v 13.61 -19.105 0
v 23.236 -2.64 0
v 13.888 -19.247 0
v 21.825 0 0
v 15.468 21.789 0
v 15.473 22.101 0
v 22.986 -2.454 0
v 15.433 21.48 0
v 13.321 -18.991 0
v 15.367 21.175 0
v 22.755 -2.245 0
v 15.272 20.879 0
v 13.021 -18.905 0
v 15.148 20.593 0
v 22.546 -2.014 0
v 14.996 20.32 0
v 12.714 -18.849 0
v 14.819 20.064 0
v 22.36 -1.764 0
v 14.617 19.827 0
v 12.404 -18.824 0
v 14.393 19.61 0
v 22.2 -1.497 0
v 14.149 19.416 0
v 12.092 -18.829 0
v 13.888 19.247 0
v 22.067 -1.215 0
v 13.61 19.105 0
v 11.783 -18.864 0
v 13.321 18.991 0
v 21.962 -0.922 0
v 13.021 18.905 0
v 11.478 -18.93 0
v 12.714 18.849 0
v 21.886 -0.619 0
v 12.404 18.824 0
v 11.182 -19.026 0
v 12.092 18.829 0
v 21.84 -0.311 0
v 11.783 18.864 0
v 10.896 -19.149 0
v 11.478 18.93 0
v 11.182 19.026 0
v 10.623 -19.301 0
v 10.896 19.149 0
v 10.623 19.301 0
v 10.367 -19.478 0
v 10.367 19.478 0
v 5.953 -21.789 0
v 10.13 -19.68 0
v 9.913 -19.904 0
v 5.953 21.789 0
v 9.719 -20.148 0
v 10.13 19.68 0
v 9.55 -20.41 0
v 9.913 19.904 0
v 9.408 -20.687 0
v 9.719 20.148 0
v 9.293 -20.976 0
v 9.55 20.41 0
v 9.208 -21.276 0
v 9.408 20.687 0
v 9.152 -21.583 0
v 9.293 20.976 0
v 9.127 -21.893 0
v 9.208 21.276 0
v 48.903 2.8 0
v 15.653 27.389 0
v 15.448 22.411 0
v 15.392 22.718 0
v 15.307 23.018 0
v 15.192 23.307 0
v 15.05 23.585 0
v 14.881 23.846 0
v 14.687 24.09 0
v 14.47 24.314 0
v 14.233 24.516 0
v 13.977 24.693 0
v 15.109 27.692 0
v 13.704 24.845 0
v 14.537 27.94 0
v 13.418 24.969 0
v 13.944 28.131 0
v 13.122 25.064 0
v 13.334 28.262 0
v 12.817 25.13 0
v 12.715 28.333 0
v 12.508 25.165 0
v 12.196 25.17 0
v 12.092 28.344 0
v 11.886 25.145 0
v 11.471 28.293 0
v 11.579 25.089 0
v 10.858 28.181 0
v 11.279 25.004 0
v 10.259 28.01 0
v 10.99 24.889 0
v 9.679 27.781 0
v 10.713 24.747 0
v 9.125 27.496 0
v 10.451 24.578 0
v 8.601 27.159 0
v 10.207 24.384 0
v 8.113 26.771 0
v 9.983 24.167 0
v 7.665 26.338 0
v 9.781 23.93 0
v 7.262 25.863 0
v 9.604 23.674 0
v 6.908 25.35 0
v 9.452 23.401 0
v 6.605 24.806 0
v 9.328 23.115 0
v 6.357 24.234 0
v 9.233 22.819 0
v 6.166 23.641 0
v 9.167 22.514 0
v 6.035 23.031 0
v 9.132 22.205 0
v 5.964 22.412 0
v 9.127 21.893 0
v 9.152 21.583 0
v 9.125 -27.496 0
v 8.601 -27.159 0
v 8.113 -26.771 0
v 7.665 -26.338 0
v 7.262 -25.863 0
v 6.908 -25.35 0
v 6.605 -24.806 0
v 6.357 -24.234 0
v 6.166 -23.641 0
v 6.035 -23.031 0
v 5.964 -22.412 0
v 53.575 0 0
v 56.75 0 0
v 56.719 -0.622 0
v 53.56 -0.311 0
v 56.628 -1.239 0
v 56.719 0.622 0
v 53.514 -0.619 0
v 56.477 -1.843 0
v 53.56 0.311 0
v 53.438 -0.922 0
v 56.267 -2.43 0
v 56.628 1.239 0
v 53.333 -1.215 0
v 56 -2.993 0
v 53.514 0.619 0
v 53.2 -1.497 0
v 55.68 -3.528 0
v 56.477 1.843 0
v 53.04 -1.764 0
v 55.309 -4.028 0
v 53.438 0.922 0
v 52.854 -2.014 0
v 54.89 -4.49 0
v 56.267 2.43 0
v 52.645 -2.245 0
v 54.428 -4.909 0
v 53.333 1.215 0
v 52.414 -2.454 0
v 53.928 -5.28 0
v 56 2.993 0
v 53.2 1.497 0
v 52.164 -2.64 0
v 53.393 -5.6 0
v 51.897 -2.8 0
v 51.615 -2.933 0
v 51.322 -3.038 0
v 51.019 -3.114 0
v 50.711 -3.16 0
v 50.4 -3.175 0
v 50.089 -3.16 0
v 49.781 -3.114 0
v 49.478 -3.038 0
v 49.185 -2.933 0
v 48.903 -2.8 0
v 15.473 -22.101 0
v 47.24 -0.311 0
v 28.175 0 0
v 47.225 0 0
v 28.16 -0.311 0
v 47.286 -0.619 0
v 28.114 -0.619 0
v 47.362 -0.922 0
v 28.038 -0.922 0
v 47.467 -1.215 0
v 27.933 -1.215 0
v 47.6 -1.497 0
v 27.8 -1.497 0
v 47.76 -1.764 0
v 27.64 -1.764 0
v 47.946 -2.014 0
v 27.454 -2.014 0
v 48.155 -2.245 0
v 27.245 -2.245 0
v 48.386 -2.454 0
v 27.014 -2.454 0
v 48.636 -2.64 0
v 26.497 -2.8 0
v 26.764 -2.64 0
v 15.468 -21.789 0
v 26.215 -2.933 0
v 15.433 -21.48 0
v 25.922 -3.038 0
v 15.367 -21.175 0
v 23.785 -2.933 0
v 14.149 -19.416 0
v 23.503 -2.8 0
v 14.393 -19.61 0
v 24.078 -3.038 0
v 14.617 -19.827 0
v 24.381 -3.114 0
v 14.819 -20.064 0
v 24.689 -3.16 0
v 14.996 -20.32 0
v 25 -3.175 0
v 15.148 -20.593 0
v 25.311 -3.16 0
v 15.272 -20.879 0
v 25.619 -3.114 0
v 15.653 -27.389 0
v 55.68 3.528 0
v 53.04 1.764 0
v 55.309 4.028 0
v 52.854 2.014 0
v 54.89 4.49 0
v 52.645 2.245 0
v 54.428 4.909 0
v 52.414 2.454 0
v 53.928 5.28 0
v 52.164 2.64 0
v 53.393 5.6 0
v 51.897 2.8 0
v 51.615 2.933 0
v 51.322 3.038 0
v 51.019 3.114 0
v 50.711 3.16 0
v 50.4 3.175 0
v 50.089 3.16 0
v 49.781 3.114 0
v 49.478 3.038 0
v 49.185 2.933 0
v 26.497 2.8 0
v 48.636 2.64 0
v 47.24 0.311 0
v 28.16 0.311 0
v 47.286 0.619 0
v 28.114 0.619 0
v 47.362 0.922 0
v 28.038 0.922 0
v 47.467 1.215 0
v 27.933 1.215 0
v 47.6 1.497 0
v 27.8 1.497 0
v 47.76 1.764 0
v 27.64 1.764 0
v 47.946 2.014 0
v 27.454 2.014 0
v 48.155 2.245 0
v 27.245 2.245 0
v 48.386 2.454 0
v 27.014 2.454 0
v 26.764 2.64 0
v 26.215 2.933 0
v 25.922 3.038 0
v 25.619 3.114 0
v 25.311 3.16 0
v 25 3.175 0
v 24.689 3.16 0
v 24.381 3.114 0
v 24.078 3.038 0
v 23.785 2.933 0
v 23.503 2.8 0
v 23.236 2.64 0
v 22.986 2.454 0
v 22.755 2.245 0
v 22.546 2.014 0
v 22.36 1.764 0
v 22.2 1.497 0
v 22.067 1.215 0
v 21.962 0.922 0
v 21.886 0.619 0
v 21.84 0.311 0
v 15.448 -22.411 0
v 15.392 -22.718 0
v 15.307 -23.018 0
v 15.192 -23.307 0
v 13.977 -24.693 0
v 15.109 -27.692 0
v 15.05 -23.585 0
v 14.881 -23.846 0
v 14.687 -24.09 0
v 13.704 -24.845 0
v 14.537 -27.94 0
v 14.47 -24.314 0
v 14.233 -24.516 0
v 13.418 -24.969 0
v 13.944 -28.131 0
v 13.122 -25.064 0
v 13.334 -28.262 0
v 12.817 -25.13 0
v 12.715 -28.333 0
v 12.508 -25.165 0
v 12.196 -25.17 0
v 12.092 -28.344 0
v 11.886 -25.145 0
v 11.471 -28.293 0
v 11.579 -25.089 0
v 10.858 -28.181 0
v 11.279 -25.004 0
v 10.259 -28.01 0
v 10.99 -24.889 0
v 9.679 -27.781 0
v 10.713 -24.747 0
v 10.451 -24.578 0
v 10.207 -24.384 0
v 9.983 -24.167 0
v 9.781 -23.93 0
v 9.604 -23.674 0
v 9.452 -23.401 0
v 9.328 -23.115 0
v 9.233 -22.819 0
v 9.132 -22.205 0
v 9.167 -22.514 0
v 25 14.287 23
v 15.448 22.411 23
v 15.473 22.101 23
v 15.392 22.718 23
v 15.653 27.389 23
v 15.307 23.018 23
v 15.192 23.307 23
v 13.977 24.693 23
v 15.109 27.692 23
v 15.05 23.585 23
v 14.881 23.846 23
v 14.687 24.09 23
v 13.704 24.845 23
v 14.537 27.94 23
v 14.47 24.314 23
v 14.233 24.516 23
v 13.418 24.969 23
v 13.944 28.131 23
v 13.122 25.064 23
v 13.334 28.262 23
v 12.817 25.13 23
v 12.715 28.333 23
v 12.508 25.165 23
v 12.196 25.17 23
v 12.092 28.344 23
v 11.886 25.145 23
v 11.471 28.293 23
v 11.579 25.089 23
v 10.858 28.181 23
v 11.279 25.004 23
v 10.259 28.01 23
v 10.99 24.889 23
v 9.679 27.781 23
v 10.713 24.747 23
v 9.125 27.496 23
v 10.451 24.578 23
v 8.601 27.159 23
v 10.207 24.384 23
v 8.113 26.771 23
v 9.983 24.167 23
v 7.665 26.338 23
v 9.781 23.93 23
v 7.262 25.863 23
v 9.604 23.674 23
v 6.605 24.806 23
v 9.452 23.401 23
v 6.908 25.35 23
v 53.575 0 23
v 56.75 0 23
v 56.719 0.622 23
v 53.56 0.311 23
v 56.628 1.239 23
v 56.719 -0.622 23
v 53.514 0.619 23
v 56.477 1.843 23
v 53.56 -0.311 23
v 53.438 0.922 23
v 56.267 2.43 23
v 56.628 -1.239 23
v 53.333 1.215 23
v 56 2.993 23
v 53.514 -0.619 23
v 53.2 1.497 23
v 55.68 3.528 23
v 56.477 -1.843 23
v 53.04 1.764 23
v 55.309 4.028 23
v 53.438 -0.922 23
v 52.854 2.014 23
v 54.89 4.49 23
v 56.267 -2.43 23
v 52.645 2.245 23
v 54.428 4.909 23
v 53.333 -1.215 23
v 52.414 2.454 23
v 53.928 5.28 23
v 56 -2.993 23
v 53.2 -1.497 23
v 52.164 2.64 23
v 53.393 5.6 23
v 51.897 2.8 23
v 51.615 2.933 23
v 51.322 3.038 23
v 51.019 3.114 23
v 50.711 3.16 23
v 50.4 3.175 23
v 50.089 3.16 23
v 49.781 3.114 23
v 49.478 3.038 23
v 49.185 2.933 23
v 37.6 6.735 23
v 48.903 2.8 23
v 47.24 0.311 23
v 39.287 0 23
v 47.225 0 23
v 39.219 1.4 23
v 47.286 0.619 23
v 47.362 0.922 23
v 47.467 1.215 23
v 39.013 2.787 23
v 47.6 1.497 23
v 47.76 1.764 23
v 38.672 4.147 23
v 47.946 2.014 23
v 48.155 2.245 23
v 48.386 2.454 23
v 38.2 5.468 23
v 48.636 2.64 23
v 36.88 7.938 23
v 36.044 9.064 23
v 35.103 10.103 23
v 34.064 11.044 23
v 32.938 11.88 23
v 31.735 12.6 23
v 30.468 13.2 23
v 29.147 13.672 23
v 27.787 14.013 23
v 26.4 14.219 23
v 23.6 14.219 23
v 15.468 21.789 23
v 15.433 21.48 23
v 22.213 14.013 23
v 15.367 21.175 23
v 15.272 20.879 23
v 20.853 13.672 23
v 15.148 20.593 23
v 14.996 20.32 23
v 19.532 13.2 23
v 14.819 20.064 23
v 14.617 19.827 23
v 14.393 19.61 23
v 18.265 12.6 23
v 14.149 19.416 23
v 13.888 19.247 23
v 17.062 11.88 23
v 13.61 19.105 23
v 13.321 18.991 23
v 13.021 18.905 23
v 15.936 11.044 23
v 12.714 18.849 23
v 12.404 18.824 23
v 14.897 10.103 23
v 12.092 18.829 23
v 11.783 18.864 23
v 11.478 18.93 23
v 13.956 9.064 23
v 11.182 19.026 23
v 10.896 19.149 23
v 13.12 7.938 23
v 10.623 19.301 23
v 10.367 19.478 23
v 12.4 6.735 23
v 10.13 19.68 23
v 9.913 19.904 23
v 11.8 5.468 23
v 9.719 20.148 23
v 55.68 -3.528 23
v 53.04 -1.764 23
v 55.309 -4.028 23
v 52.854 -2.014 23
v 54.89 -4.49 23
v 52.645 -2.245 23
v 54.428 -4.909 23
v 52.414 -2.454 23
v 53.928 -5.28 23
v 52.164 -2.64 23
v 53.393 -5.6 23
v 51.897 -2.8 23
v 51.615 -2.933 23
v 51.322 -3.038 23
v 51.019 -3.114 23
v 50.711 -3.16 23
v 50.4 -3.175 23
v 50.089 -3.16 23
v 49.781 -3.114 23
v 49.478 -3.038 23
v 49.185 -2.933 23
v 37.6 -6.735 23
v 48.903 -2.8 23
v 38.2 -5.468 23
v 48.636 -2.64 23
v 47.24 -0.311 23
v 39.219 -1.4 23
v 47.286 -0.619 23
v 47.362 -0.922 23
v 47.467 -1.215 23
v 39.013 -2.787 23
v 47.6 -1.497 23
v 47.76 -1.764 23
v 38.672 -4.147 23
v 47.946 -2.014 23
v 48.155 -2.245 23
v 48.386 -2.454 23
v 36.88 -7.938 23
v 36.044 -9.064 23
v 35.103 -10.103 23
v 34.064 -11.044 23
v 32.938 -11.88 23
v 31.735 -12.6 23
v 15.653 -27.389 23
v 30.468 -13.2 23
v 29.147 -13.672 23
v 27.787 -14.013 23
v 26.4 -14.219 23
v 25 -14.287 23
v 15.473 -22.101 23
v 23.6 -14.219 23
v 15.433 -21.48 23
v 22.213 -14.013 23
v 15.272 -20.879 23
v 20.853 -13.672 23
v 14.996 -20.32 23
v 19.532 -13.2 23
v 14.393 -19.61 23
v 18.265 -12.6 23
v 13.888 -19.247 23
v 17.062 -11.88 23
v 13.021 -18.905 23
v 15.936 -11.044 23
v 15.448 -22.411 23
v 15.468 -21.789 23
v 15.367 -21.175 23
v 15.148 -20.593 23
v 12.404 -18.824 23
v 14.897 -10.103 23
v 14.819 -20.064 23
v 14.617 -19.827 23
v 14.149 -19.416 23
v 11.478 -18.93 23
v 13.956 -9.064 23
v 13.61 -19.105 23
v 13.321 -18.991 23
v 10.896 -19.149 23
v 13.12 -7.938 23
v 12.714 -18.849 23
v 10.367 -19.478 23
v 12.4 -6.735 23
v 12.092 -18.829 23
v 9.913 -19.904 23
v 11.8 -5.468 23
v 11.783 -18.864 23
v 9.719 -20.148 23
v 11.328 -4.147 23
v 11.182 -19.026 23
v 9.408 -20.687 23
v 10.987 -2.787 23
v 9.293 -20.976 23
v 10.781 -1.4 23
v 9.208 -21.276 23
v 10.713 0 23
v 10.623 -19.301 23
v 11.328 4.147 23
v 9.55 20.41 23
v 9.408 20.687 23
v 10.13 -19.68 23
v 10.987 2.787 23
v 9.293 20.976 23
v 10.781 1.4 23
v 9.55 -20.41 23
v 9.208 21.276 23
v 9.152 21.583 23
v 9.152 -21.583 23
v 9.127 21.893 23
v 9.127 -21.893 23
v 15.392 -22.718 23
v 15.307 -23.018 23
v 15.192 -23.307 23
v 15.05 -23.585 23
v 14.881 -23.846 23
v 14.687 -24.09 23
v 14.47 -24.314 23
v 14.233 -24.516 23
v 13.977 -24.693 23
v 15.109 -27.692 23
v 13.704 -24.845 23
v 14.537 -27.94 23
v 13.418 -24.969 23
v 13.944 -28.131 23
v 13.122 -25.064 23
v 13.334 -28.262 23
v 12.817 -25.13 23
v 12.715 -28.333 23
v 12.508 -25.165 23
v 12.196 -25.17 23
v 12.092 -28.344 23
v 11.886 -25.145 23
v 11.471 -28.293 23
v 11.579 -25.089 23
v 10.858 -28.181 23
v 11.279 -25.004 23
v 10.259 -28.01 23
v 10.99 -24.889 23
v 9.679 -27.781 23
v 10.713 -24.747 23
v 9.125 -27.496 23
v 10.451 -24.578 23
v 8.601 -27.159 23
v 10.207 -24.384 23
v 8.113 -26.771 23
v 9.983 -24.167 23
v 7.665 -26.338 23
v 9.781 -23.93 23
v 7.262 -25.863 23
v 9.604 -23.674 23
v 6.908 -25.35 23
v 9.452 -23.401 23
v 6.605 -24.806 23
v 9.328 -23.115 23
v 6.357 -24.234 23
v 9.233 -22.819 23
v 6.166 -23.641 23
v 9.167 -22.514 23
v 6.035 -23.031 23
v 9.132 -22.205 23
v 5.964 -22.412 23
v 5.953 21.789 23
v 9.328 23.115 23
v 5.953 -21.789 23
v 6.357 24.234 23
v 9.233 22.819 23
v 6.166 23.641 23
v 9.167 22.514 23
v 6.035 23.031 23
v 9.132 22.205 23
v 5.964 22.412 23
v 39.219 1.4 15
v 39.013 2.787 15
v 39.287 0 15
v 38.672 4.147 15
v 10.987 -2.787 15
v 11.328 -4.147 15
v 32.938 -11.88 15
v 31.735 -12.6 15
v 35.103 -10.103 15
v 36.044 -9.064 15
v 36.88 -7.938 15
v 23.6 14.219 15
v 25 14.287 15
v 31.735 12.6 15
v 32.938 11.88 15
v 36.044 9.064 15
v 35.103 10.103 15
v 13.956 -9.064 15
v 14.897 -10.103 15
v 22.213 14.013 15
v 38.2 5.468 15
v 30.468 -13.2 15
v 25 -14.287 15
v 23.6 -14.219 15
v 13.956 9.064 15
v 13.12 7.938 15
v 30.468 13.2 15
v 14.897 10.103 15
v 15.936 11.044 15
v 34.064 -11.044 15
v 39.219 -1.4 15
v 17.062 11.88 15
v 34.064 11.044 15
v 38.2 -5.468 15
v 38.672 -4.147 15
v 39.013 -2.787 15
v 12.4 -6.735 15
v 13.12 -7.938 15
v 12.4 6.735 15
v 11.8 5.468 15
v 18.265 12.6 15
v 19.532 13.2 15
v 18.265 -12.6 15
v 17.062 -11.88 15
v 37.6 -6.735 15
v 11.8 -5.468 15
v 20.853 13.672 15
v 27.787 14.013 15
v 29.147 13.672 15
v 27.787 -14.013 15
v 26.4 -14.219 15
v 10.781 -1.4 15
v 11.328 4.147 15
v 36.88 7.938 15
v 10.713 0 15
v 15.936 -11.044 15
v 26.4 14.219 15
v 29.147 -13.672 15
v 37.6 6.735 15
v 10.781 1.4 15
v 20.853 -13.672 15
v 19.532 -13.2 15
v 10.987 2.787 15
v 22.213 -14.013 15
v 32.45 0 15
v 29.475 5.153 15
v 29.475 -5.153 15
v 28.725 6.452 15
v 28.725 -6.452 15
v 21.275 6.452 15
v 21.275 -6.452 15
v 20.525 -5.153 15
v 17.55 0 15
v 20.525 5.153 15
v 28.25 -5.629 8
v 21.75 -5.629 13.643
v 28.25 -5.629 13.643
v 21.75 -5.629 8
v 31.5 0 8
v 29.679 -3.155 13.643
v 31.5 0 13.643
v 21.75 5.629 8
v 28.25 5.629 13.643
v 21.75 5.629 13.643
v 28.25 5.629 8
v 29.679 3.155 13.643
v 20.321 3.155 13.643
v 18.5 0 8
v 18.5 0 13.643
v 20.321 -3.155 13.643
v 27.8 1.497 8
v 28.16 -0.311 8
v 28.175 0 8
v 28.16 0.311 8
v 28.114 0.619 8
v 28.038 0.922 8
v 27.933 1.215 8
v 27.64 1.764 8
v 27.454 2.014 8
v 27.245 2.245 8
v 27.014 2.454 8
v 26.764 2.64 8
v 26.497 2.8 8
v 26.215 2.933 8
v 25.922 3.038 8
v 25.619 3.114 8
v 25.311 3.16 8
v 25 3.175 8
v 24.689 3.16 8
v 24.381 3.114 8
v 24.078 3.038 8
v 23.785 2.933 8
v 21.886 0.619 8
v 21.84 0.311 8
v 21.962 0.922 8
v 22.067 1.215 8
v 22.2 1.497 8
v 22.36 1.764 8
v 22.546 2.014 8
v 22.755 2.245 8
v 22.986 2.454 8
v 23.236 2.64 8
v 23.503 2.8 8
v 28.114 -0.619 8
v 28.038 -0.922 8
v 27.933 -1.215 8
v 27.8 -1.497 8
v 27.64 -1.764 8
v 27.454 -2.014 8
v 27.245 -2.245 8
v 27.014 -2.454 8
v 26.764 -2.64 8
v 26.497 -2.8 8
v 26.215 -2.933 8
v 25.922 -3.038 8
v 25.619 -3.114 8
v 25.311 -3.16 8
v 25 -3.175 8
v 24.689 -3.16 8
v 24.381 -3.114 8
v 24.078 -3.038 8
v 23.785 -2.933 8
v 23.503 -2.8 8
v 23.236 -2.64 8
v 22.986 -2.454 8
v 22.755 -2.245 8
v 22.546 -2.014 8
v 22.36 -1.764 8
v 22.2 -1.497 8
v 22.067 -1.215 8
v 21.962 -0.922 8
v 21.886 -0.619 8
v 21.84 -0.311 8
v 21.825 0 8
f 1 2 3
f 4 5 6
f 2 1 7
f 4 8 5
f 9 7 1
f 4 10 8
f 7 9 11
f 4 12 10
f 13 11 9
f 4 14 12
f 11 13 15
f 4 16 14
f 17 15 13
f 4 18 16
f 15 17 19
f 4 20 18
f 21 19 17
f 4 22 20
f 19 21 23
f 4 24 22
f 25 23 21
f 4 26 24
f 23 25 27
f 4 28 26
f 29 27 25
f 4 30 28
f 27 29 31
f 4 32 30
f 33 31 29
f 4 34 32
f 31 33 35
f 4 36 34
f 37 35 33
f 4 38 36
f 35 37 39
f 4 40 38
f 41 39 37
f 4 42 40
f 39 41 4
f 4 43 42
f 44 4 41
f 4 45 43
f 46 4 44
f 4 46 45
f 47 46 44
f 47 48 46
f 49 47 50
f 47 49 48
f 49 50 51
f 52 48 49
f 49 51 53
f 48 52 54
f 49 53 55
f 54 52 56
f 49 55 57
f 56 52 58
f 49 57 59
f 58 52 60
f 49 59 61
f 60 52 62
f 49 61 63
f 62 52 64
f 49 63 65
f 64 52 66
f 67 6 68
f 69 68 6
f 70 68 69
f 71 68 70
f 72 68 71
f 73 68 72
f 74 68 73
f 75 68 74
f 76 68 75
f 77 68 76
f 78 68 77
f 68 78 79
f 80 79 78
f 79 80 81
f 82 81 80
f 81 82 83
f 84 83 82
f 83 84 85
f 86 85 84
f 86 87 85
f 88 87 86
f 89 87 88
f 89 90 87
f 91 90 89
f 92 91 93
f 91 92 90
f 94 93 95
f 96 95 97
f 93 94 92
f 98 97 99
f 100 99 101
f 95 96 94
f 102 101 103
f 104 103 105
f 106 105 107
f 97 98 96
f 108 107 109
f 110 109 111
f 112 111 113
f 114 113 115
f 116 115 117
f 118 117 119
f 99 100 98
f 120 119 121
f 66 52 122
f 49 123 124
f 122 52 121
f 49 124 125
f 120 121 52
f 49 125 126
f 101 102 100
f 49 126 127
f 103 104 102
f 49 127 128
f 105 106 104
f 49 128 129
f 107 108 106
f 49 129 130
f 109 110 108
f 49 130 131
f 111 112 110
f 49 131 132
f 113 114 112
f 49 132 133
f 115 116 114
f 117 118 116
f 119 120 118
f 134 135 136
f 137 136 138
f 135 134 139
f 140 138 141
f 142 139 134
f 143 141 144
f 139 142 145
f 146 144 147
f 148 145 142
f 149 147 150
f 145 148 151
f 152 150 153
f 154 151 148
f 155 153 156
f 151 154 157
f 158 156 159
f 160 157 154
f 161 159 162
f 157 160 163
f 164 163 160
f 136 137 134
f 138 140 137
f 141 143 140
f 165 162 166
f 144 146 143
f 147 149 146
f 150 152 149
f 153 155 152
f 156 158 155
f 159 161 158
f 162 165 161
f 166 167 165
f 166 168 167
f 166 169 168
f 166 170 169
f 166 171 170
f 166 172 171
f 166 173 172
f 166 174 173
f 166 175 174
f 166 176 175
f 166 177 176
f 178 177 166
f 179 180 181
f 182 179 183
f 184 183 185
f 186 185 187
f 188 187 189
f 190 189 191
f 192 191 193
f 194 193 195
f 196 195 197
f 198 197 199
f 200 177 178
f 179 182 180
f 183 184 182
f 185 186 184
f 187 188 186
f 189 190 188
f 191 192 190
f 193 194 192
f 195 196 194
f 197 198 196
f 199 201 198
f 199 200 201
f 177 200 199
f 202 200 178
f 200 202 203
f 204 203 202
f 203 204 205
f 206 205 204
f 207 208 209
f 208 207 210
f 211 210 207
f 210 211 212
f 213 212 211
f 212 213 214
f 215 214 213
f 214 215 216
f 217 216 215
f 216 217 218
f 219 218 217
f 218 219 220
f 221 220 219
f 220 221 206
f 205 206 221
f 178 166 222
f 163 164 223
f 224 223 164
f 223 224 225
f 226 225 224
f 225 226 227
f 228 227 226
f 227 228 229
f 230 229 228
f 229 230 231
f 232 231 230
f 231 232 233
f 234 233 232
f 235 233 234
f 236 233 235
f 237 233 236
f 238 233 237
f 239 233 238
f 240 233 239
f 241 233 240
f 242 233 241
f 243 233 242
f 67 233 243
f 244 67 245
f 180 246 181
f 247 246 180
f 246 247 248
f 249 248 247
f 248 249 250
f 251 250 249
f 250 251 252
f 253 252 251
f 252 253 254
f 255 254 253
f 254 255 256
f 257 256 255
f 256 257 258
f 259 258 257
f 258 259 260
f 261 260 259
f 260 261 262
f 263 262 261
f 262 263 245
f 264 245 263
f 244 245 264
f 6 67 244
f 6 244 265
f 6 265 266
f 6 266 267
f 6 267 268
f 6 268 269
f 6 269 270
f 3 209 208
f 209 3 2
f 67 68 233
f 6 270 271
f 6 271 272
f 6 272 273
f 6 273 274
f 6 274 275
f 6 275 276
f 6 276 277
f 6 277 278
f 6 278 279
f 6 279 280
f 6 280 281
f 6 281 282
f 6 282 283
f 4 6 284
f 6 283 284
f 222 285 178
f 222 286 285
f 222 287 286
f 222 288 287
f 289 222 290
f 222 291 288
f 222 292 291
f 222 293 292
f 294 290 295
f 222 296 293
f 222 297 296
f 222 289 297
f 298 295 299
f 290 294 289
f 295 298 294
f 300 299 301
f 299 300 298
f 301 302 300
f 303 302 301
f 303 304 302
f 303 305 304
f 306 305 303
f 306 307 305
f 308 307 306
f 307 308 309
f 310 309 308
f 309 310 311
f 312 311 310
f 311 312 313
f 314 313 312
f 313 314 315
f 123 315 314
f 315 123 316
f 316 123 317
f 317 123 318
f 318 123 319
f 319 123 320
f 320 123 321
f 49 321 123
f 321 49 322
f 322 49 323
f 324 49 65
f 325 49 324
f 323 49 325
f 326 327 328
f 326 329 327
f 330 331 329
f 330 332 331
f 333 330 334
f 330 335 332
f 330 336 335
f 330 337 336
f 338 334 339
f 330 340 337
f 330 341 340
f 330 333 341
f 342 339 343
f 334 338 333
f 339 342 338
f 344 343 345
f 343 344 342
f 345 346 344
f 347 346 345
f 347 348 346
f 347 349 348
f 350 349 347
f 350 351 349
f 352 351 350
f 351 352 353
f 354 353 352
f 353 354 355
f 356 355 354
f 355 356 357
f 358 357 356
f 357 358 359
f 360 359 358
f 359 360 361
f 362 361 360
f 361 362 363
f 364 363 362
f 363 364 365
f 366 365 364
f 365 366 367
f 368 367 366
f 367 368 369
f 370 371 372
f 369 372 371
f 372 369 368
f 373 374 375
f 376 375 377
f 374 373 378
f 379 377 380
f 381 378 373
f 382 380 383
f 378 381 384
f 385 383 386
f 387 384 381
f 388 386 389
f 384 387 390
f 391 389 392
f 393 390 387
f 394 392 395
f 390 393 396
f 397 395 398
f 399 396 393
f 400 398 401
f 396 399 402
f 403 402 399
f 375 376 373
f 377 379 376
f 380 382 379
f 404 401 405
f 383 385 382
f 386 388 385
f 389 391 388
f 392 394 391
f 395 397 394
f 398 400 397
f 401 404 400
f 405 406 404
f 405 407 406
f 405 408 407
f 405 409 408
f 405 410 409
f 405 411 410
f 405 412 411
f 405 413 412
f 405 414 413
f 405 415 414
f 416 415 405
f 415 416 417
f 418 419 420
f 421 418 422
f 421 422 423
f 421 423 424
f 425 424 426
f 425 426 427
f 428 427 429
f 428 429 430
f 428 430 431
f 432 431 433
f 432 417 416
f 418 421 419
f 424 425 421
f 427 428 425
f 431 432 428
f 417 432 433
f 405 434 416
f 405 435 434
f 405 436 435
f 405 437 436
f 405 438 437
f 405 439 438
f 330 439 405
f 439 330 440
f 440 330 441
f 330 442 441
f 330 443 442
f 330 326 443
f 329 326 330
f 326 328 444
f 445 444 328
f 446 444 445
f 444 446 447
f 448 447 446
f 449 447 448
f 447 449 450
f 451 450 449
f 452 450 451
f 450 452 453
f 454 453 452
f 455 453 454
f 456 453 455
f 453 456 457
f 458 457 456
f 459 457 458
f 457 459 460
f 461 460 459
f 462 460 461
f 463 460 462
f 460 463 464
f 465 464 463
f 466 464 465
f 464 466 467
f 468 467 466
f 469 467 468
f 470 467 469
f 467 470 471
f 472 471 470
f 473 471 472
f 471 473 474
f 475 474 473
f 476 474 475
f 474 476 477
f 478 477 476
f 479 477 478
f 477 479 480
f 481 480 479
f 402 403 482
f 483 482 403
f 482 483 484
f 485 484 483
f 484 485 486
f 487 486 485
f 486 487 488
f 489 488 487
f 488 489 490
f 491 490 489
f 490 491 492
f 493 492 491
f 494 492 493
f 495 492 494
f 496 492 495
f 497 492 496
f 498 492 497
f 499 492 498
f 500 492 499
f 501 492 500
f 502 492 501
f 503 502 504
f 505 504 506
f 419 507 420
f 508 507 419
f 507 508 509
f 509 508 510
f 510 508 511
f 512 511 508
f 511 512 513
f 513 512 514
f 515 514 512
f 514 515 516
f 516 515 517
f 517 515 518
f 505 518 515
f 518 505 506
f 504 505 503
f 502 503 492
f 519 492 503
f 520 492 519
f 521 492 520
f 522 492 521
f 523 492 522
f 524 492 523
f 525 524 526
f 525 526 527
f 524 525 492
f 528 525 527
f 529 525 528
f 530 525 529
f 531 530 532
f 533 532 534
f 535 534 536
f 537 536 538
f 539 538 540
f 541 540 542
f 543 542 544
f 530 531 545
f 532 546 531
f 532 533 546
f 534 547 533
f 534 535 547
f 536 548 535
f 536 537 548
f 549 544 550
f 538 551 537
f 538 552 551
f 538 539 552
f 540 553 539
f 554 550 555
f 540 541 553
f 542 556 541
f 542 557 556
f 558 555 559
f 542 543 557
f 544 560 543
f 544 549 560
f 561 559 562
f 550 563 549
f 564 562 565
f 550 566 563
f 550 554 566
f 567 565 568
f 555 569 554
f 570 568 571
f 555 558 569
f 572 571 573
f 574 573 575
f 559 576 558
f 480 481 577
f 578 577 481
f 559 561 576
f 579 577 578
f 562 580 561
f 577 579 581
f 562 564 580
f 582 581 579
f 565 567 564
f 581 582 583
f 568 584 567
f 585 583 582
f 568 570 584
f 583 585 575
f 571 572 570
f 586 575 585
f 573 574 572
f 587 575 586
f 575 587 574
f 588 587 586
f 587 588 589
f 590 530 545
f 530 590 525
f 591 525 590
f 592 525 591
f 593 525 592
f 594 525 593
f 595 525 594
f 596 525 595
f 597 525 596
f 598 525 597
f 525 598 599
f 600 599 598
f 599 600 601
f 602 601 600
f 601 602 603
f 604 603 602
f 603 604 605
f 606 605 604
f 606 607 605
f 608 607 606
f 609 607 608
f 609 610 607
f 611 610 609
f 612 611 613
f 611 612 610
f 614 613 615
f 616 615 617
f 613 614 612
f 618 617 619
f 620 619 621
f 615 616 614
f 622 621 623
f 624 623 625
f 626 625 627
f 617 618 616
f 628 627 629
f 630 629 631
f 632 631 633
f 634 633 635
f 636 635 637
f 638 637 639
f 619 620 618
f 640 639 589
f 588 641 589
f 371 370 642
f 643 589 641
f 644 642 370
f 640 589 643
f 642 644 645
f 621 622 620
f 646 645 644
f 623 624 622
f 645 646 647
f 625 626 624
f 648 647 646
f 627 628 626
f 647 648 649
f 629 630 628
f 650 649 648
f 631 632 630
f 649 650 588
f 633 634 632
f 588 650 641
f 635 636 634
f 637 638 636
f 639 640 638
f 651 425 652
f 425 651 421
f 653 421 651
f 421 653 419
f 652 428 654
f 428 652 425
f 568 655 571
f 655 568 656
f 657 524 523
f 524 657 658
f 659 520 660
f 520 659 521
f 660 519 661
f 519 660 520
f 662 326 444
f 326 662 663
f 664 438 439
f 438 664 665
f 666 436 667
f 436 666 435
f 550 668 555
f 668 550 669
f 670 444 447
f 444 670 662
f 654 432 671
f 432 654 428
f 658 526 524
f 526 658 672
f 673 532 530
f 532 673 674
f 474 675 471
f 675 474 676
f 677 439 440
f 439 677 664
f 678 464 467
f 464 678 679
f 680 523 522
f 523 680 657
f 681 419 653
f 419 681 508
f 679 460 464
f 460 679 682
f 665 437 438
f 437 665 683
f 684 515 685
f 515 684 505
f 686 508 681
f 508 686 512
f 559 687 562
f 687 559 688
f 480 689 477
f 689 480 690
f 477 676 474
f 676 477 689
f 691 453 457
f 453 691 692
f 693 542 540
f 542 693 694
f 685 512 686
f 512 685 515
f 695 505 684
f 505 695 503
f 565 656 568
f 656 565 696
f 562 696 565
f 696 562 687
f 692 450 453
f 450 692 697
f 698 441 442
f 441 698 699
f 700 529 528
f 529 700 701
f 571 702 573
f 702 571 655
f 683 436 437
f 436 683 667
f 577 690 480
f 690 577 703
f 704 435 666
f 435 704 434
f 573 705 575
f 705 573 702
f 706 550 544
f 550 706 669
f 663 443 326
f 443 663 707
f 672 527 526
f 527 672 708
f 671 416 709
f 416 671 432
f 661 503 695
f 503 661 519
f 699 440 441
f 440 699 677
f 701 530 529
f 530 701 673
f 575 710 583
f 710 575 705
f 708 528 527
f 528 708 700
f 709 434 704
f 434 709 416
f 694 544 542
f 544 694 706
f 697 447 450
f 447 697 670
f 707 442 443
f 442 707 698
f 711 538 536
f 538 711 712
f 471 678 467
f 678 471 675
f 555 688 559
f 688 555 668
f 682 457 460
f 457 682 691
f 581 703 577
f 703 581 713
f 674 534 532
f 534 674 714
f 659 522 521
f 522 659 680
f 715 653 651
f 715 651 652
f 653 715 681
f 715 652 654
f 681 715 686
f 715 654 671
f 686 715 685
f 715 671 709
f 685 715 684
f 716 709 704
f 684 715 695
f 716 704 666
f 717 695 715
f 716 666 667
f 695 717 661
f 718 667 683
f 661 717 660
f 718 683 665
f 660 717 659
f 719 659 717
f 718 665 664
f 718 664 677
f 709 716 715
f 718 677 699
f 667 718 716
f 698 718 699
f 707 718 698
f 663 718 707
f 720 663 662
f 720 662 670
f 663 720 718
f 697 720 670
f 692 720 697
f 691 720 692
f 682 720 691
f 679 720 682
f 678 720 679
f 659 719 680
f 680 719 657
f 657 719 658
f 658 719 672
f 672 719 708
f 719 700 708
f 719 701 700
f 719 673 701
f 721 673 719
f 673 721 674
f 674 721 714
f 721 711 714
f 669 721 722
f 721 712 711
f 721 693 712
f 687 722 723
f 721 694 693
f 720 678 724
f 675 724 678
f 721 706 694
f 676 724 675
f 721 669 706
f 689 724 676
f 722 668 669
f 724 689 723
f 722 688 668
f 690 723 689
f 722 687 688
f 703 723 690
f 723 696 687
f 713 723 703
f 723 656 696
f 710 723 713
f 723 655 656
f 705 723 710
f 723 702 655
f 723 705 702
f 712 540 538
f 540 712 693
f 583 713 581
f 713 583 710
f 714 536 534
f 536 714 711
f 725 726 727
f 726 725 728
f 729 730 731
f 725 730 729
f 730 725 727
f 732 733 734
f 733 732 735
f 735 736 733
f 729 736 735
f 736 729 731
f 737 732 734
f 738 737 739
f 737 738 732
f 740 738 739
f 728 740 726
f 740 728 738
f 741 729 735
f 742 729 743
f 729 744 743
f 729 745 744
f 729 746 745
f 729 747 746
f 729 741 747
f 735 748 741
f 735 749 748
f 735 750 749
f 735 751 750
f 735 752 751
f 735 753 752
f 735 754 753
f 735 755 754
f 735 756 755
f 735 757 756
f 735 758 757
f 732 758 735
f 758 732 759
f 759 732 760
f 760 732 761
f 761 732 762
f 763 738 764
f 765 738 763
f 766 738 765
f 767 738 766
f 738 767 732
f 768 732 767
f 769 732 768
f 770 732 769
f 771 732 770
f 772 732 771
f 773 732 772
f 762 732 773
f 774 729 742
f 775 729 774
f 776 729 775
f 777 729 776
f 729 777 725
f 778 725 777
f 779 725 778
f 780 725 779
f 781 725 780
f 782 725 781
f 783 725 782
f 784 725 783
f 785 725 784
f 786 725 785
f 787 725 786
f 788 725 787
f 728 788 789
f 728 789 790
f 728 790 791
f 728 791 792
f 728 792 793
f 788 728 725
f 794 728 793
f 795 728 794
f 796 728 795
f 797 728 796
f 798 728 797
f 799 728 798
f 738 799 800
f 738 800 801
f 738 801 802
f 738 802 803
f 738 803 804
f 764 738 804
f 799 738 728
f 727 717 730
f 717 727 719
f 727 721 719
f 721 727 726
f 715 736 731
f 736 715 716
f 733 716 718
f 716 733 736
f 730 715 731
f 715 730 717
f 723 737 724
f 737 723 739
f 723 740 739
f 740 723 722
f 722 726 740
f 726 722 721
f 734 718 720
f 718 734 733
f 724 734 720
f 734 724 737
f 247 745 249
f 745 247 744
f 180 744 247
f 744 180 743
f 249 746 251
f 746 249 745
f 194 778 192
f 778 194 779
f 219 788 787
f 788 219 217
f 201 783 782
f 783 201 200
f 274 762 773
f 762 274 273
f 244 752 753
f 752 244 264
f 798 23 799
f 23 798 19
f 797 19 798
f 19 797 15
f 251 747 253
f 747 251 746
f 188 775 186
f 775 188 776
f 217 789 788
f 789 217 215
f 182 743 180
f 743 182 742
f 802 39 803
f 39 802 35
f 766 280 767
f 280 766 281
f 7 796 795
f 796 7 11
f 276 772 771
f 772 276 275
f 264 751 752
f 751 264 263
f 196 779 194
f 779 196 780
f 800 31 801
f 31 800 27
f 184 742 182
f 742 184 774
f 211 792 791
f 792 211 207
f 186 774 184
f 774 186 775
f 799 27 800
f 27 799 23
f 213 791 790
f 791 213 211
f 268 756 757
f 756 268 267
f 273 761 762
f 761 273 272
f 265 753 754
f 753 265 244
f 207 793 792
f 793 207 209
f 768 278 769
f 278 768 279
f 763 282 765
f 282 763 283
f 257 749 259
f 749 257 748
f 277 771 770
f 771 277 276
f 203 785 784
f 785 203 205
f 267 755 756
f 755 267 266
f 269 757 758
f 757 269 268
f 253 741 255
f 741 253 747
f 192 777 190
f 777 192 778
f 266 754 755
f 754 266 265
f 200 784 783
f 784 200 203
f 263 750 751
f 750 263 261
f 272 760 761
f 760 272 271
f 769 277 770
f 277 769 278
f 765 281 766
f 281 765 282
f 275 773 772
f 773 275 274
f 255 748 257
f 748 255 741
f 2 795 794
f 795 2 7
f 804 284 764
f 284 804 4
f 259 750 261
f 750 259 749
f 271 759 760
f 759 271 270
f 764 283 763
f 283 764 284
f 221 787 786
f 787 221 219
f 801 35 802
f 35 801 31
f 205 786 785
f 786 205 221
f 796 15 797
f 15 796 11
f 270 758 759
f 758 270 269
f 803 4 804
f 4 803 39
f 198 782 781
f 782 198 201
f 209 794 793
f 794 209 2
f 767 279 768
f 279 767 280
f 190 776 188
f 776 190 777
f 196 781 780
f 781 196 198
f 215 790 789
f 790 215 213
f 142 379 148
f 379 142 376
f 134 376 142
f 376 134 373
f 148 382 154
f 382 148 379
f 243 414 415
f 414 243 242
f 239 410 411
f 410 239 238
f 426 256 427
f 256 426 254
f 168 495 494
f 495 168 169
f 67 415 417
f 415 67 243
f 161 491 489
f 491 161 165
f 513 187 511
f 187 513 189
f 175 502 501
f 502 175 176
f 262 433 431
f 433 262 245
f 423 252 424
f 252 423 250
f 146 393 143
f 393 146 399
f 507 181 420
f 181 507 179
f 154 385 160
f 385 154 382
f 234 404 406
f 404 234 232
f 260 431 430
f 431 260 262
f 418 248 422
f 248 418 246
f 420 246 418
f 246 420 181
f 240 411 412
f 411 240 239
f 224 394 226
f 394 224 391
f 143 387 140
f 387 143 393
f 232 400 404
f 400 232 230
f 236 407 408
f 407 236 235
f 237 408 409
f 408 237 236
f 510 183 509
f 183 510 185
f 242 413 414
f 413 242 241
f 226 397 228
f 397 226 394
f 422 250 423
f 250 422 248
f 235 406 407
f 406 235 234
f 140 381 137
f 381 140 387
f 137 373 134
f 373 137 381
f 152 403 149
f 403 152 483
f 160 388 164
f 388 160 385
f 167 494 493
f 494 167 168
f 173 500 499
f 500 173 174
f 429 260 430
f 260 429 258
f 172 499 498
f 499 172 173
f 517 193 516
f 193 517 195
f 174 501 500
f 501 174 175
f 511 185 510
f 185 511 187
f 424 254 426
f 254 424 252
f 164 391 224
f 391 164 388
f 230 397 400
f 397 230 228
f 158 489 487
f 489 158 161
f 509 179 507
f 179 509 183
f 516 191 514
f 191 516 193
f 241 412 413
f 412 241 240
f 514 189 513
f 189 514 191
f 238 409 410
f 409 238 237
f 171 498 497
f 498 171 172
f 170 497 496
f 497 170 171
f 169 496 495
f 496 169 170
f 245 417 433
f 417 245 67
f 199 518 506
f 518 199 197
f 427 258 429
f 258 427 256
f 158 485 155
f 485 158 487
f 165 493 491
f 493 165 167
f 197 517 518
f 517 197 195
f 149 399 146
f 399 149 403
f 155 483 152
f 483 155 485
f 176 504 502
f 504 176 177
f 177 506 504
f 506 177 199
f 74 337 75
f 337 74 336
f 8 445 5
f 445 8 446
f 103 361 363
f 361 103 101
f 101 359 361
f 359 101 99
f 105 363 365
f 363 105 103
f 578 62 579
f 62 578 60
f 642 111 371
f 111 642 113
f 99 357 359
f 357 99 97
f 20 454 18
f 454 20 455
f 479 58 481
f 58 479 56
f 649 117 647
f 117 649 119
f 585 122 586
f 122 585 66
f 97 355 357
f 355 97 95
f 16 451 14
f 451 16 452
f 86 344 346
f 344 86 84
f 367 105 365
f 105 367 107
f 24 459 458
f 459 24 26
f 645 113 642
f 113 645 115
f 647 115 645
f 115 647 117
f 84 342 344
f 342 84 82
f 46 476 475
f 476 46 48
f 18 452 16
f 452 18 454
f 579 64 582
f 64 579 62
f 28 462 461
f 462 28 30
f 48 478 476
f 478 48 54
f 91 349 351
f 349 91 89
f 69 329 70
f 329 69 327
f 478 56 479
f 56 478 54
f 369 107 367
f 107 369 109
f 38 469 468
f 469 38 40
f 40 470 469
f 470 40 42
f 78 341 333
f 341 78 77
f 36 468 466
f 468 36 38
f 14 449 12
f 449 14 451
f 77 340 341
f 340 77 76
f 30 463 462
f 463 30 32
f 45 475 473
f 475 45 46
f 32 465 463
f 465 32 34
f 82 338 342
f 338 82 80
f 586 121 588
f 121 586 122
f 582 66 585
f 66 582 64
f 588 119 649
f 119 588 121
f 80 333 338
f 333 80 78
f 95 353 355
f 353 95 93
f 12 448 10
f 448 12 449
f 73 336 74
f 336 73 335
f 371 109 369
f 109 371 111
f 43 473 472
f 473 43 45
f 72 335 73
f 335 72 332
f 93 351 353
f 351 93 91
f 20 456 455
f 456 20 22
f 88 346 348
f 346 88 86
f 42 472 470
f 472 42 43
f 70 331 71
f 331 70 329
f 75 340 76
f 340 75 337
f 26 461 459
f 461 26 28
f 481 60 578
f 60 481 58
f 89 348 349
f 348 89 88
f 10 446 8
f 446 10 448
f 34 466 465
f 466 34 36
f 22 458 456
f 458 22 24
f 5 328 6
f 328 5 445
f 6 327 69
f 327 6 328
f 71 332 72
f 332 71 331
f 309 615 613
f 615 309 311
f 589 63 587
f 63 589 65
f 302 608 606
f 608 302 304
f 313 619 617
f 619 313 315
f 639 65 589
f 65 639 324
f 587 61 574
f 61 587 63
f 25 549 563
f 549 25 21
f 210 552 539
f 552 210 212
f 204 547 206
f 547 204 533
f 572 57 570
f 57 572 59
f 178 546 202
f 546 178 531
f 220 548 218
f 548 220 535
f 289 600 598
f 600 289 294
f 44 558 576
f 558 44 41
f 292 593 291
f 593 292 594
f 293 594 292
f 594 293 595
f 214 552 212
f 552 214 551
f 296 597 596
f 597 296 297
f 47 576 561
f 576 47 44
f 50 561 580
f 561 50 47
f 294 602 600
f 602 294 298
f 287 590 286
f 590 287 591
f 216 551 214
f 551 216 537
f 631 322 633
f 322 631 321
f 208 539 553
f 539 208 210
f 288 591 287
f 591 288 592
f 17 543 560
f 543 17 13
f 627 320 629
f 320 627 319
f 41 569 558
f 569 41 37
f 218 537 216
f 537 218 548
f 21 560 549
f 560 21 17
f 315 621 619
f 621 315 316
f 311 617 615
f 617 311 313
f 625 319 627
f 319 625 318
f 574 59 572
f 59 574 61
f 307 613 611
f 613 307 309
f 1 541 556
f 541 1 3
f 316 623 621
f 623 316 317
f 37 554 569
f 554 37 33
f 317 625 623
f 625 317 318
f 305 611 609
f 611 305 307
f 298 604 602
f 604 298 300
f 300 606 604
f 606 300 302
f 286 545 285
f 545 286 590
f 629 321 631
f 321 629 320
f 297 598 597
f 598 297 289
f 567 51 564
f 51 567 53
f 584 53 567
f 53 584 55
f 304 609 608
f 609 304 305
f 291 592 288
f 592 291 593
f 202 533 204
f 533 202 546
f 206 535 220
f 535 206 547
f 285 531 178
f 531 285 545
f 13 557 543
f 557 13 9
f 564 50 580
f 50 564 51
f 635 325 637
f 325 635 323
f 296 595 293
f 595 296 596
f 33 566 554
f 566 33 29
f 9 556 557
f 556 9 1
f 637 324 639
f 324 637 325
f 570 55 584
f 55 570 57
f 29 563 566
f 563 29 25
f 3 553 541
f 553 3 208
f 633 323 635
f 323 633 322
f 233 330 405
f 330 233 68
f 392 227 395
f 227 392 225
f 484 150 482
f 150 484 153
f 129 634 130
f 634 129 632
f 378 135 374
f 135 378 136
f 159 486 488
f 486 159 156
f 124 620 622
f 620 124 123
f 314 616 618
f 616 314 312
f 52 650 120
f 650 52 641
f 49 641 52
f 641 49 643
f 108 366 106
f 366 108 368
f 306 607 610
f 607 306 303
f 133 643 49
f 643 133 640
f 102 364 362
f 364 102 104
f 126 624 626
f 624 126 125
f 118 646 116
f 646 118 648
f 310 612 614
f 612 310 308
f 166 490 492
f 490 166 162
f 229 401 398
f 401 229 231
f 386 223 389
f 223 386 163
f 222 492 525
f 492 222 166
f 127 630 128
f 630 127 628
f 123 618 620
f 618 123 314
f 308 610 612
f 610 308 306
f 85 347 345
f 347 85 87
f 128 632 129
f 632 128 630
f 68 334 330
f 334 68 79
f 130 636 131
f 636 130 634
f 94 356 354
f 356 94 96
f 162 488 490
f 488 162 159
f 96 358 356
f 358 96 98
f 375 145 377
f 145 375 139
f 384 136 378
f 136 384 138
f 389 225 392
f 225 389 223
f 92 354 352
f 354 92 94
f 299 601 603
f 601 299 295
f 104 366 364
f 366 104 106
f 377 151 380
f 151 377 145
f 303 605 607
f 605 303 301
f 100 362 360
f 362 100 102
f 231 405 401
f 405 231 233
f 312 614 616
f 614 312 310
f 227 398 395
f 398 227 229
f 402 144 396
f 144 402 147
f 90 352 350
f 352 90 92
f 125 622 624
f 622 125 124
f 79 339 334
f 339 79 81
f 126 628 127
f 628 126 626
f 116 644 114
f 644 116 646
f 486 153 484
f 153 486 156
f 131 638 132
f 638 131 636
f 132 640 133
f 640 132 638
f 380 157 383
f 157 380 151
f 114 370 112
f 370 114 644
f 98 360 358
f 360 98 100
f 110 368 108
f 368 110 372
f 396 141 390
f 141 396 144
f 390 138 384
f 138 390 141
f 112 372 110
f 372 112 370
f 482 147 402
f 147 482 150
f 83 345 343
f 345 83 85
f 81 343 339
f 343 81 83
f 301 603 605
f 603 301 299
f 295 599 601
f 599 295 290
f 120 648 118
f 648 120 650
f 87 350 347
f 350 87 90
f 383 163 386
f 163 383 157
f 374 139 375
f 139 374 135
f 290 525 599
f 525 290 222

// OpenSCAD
$inch = 25.4;

$top = 1;

module bolt_chassis(height) {
    difference() {
        //cylinder(d=2*$inch, h=height, $fn=64);
        hull() {
            for (nub = [0:2]) {
                rotate(nub*120, [0,0,1]) {
                    translate([2*$inch / 2, 0,0]) {
                        cylinder(d=0.5*$inch, h=height, $fn=64);
                    }
                }
            }            
        }
        cylinder(d=1.35*$inch, h=height, $fn=64);
        for (bolthole = [0:2]) {
            rotate(bolthole*120, [0,0,1]) {
                translate([2*$inch / 2, 0,-1]) {
                    cylinder(d=1/4*$inch, h=height+2, $fn=64);
                }
            }
        }
    }
}

module top_body() {
    difference() {
        translate([0,0,0]) {
            cylinder(d=1.35*$inch, h=23, $fn=64);
        }
        translate([0,0,15]) {
            cylinder(d=1.125*$inch, h=8, $fn=64);
        }
        // hex head
        translate([0,0,8]) {
            cylinder(d=13, h=8, $fn=6);
        }
        // ease the edges of the hex hole
        translate([0,0,11.5]) {
            cylinder(d1=10, d2=17, h=5, $fn=6);
        }
        // bolt thru hole
        translate([0,0,-1]) {
            cylinder(d=(1/4*$inch), h=31, $fn=64);
        }
    }
}

module bottom_body() {
    difference() {
        translate([0,0,0]) {
            cylinder(d=1.35*$inch, h=11, $fn=64);
        }
        translate([0,0,3]) {
            cylinder(d=1.125*$inch, h=8, $fn=64);
        }
        // bottom thru hole for knife mount
        translate([0,0,-1]) {
            cylinder(d=22, h=13, $fn=64);
        }
    }
}

if ($top) {
    translate([25,0,0]) {
        union() {
            top_body();
            bolt_chassis(23);
        }
    }
} else {
    translate([25,0,0]) {
        union() {
            bottom_body();
            bolt_chassis(11);
        }
    }
}

/*
translate([0,0,30]) {
    cylinder(d=10, h=5, $fn=64);
}
translate([0,0,30]) {
    cylinder(d=10, h=10, $fn=6);
}
*/
